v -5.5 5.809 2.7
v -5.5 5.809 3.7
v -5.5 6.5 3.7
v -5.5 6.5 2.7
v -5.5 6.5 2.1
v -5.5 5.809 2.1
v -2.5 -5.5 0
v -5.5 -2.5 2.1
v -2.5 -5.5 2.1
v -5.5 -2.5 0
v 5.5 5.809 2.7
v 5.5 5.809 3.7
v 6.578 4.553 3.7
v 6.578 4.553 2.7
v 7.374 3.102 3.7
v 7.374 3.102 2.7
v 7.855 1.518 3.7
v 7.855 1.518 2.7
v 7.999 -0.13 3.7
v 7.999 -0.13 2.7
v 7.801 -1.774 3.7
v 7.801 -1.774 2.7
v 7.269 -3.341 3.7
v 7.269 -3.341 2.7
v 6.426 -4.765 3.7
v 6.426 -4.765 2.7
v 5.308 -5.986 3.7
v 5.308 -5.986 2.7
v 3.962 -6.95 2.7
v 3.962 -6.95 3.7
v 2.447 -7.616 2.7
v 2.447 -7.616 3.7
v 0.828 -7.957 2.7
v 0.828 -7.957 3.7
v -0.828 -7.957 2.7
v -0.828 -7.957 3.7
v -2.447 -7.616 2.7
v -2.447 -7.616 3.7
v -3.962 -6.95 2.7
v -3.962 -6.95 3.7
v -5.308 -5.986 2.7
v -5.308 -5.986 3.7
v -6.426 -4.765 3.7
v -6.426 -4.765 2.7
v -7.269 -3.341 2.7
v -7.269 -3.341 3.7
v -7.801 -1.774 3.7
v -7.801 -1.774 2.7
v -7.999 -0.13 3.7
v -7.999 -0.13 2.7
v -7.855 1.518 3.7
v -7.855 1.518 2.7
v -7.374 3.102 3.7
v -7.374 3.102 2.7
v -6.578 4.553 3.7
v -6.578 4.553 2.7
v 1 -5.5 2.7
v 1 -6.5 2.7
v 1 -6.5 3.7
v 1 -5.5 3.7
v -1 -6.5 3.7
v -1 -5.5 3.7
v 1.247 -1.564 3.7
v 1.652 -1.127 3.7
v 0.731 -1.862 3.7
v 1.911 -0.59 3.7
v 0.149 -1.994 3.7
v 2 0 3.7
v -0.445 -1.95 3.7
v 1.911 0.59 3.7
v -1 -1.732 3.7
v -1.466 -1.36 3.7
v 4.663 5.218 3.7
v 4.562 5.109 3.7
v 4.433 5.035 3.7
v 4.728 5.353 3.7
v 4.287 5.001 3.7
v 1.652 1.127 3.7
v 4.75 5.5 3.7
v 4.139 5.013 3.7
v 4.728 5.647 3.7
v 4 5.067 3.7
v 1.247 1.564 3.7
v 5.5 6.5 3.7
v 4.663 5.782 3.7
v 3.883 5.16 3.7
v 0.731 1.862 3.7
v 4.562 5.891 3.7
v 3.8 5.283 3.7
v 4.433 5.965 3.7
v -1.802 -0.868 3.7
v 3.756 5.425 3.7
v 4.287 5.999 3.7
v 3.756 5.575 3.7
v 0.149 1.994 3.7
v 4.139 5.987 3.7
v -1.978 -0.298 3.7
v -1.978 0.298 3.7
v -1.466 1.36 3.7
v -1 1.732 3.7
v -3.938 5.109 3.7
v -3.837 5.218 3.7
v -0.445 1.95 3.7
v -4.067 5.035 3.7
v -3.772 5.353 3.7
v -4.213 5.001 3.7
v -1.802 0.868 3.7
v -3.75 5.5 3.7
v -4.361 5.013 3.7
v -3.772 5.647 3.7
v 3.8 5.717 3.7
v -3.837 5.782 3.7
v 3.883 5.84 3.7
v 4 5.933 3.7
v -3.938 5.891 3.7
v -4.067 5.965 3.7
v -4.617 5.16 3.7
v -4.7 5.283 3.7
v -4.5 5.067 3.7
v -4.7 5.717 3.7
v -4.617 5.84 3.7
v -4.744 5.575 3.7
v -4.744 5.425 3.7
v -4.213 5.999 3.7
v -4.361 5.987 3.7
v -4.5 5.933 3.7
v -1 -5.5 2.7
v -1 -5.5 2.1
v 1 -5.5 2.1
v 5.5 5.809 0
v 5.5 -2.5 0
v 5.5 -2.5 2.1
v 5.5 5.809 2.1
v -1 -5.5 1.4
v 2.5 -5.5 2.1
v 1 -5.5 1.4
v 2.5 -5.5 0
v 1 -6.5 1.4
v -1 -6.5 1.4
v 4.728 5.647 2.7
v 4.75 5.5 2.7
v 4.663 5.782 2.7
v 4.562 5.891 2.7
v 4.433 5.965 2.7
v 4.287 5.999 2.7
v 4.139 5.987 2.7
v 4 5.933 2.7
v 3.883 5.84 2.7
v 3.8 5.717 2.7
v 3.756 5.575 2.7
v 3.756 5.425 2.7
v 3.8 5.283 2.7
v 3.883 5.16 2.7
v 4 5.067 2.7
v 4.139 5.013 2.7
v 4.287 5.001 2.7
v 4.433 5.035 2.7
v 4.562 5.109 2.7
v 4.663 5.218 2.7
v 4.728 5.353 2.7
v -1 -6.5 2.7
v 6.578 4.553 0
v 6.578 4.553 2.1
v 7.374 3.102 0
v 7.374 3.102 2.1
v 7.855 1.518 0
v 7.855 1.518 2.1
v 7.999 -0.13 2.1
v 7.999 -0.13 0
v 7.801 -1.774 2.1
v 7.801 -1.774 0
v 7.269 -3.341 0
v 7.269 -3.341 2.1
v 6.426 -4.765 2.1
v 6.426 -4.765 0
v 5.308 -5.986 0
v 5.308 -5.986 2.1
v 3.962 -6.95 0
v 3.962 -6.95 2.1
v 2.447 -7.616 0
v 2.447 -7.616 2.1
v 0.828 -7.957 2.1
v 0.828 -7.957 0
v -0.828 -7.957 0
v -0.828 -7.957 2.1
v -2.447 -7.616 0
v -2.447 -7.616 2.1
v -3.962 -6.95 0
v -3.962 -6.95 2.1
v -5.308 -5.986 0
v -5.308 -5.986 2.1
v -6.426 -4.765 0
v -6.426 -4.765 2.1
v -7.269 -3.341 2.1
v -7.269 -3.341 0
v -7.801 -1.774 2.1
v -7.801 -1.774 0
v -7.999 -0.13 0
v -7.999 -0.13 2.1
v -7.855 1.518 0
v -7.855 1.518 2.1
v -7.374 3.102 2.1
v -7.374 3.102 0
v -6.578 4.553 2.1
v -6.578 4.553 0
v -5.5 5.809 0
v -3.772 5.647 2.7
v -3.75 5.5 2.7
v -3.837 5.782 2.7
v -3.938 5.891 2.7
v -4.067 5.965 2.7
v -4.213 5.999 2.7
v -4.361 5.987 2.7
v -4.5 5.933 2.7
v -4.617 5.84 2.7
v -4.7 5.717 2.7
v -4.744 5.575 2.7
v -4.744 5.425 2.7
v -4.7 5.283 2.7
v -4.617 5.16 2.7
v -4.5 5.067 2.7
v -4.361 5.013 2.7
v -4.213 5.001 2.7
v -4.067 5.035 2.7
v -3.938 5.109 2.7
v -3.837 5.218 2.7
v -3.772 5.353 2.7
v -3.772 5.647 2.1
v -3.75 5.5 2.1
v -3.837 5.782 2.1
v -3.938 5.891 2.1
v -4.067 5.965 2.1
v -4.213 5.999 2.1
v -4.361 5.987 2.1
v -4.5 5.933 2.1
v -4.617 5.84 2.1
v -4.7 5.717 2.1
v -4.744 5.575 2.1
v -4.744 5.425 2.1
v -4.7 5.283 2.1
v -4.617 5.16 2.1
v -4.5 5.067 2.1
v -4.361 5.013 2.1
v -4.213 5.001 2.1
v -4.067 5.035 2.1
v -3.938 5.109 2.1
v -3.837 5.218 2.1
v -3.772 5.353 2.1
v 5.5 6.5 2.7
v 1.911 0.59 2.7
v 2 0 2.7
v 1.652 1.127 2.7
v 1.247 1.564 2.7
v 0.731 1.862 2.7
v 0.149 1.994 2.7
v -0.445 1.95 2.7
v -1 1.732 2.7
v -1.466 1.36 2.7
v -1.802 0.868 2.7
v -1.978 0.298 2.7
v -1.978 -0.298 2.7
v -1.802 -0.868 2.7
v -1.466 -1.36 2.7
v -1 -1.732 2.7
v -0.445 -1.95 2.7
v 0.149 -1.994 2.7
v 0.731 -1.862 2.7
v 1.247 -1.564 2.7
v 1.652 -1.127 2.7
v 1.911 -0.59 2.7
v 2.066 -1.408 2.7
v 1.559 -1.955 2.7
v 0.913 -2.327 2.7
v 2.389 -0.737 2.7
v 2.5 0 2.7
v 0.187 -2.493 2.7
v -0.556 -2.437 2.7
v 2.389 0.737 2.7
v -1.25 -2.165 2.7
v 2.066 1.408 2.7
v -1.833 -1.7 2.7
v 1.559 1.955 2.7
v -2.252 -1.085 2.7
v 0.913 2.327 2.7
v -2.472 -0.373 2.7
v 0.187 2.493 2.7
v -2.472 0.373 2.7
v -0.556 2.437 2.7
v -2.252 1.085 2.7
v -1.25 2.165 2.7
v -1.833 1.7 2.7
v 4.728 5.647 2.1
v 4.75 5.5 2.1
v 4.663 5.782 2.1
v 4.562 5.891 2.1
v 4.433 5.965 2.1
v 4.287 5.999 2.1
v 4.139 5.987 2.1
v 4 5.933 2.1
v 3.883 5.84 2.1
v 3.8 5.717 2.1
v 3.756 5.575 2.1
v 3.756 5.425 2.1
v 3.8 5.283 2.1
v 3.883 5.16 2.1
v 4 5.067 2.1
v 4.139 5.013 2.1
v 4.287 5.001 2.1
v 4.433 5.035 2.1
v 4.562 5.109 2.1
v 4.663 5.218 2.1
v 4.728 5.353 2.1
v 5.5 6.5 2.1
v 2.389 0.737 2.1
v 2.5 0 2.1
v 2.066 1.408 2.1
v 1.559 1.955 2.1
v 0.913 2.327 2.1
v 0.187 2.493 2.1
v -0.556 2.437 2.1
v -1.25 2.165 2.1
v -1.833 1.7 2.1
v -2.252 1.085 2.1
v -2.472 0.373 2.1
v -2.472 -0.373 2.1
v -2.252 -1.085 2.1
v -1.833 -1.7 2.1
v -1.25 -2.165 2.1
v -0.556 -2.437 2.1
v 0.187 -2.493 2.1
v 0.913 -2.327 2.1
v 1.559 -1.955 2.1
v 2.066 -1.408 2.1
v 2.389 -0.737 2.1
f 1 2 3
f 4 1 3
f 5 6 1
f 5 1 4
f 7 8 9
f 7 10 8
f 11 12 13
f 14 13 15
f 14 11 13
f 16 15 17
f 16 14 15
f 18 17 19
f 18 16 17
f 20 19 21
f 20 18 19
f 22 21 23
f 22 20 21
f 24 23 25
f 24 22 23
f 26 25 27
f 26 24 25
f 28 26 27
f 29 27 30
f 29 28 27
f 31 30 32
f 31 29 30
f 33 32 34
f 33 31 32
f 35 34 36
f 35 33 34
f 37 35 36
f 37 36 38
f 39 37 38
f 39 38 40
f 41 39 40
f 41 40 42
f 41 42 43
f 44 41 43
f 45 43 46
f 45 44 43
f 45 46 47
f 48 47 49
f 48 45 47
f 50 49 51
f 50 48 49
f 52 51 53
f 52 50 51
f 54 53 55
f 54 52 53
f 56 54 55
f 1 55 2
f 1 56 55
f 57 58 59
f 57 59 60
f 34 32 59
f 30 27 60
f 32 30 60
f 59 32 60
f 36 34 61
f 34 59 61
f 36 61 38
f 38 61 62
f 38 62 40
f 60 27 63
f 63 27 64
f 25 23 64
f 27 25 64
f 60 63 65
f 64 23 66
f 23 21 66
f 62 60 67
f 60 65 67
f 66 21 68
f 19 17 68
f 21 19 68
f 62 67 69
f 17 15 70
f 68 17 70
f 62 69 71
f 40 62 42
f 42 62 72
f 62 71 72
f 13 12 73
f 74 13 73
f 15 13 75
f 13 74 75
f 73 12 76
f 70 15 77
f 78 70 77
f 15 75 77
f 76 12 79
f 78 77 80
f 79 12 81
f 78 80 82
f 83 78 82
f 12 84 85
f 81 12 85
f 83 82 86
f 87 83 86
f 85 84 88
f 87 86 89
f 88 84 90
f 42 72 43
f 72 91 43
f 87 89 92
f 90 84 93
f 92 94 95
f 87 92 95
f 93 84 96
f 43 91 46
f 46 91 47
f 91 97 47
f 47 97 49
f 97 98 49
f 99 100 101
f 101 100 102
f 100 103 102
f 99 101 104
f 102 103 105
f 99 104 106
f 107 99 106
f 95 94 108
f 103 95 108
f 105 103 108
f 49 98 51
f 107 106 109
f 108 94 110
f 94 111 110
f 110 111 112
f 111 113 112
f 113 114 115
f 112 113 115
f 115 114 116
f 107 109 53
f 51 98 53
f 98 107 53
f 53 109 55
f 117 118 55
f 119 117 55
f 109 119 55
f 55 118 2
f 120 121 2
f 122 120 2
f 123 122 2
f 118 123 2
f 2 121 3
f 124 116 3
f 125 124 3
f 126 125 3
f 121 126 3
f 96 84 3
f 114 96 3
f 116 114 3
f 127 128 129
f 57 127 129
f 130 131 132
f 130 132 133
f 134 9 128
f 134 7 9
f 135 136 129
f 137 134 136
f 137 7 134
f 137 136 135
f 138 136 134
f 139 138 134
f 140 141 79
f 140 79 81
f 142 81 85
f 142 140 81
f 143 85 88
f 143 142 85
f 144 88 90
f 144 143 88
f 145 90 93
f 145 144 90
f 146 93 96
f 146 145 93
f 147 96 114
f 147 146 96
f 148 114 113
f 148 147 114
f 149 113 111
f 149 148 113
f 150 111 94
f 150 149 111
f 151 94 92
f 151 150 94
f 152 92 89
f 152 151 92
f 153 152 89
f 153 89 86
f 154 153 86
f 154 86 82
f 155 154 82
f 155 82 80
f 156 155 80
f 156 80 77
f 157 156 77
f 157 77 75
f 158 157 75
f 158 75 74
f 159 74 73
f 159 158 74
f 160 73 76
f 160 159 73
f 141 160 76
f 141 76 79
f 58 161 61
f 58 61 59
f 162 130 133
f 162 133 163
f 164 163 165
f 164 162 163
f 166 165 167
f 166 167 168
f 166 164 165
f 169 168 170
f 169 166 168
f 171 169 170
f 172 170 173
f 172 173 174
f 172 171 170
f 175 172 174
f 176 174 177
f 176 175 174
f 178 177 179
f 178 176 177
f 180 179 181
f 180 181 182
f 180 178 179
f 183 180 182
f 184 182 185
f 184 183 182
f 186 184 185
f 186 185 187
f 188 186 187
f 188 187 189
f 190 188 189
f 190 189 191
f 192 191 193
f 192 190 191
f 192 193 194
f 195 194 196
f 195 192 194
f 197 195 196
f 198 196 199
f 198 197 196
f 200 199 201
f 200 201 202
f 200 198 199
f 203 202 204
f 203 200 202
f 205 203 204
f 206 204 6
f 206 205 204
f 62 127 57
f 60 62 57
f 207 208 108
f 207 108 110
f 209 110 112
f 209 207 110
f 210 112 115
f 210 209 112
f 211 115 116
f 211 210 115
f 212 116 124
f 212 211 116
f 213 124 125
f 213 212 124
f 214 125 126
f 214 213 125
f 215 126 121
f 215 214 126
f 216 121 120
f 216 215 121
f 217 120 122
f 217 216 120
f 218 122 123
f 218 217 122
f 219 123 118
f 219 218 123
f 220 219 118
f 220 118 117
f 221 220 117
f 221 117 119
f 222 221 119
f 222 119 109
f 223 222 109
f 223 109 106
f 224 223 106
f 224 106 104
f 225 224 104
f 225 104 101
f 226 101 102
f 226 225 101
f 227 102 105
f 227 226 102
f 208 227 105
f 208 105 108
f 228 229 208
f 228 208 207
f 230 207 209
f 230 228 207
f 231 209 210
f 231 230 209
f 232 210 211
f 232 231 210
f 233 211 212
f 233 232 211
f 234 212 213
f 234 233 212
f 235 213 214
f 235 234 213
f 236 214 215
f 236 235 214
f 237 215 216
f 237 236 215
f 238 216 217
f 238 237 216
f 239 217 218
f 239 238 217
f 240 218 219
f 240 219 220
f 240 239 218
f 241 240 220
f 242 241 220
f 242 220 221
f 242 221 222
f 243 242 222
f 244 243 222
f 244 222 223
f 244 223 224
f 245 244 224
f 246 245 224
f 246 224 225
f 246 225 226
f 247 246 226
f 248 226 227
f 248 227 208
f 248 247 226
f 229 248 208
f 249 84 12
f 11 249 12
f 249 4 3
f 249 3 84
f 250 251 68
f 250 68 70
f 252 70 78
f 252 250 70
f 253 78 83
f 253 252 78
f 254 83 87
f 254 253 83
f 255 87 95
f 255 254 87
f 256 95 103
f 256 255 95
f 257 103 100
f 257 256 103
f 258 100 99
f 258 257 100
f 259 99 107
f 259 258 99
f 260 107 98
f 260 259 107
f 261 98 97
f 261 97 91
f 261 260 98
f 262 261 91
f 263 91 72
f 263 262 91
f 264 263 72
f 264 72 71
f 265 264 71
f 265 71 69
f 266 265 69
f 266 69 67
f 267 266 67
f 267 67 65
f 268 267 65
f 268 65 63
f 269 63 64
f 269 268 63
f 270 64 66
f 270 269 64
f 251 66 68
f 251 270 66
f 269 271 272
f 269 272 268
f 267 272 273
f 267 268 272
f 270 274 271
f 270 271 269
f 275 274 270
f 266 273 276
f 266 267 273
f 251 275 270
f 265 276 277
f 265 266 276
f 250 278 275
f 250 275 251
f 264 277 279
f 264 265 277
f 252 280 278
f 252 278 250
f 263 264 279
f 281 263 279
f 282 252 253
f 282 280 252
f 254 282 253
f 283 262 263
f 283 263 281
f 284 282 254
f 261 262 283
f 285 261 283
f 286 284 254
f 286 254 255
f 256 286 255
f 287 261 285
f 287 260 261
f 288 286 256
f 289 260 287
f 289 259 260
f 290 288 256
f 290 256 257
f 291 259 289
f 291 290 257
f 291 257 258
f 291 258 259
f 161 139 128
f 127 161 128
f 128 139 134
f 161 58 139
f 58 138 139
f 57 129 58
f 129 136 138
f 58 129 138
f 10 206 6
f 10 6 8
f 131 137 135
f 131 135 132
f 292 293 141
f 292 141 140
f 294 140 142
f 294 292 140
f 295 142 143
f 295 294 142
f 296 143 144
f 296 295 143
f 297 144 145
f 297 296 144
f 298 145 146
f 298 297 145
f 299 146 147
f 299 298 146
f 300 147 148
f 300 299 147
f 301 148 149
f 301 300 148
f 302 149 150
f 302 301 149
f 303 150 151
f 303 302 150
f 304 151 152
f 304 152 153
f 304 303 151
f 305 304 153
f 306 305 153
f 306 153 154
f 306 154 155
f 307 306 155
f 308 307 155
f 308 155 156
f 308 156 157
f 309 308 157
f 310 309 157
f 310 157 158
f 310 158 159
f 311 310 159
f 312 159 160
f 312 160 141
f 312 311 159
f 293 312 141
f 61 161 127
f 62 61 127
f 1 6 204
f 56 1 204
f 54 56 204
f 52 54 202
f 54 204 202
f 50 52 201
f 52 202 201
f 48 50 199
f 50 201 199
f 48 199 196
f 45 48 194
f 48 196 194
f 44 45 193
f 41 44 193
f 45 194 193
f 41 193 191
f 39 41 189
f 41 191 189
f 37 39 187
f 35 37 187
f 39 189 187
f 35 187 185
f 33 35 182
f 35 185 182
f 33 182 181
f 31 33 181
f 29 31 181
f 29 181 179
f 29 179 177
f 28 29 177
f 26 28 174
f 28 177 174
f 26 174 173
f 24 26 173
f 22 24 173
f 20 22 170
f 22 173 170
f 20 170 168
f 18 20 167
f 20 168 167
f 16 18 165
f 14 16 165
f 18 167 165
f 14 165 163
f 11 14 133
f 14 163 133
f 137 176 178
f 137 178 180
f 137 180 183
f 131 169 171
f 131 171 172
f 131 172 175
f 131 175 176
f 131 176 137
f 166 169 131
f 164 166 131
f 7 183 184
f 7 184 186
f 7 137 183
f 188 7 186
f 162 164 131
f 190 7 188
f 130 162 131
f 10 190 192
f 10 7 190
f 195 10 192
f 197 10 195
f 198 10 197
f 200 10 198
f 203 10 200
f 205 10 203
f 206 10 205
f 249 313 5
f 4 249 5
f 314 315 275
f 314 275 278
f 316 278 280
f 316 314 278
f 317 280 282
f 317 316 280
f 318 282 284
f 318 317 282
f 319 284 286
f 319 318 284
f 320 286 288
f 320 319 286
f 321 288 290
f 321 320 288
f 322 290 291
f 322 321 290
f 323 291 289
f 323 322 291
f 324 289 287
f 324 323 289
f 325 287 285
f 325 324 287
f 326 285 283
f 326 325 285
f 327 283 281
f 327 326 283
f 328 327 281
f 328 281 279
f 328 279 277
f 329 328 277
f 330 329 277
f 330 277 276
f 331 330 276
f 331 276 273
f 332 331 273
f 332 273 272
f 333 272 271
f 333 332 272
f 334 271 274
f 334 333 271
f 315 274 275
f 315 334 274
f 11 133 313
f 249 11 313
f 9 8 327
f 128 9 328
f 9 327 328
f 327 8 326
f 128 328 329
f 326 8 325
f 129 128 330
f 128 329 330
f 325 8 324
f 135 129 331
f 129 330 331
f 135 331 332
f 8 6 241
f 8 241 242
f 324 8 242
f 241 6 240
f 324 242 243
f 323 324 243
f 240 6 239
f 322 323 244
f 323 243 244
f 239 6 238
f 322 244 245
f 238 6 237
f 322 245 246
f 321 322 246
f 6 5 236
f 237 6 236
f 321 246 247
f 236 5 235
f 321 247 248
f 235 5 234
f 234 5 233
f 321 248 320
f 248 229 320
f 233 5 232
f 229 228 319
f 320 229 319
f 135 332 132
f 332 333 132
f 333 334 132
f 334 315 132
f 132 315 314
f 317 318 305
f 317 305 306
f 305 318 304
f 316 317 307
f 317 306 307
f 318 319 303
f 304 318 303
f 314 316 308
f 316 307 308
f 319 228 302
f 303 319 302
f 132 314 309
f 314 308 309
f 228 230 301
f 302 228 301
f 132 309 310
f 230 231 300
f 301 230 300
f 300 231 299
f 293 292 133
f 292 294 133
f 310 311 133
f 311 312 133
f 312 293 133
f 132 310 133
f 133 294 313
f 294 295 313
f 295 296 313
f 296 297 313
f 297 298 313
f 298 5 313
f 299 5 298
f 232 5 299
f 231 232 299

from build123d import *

# Parameters (mm, degrees)
BOSS_EXTRUDE1_DEPTH = 1.4
BOSS_EXTRUDE2_DEPTH = 0.7
SKETCH3_R           = 0.5
SKETCH3_R_2         = 2.5
BOSS_EXTRUDE3_DEPTH = 0.6
SKETCH4_R           = 2
SKETCH4_R_2         = 0.5
SKETCH4_W           = 2
SKETCH4_H           = 1
BOSS_EXTRUDE4_DEPTH = 1


with BuildPart() as part:
    # Sketch1 → Boss-Extrude1 (new body)
    with BuildSketch(Plane.XY):
        with BuildLine():
            Line((-5.5, 5.809475019), (-5.5, -2.5))
            Line((-5.5, -2.5), (-2.5, -5.5))
            Line((-2.5, -5.5), (2.5, -5.5))
            Line((2.5, -5.5), (5.5, -2.5))
            Line((5.5, -2.5), (5.5, 5.809475019))
            ThreePointArc((5.5, 5.809475019), (0, -8), (-5.5, 5.809475019))
        make_face()
    extrude(amount=BOSS_EXTRUDE1_DEPTH)

    # Sketch2 → Boss-Extrude2 (add)
    with BuildSketch(Plane.XY.offset(1.4)):
        with BuildLine():
            Line((-1, -5.5), (-1, -6.5))
            Line((-1, -6.5), (1, -6.5))
            Line((1, -6.5), (1, -5.5))
            Line((1, -5.5), (2.5, -5.5))
            Line((2.5, -5.5), (5.5, -2.5))
            Line((5.5, -2.5), (5.5, 5.809475019))
            ThreePointArc((5.5, 5.809475019), (0, -8), (-5.5, 5.809475019))
            Line((-5.5, 5.809475019), (-5.5, -2.5))
            Line((-5.5, -2.5), (-2.5, -5.5))
            Line((-2.5, -5.5), (-1, -5.5))
        make_face()
    extrude(amount=BOSS_EXTRUDE2_DEPTH)

    # Sketch3 → Boss-Extrude3 (add)
    # profile 1 of 2: a face of its own
    with BuildSketch(Plane.XY.offset(2.1)):
        Polygon((2.5, -5.5), (5.5, -2.5), (5.5, 6.5), (-5.5, 6.5), (-5.5, -2.5), (-2.5, -5.5), align=None)
        with Locations((4.250000001, 5.5)):
            Circle(SKETCH3_R, mode=Mode.SUBTRACT)
        Circle(SKETCH3_R_2, mode=Mode.SUBTRACT)
        with Locations((-4.249999999, 5.5)):
            Circle(SKETCH3_R, mode=Mode.SUBTRACT)
    # profile 2 of 2: a face of its own
    with BuildSketch(Plane.XY.offset(2.1)):
        with BuildLine():
            Line((-1, -6.5), (-1, -5.5))
            Line((-1, -5.5), (-2.5, -5.5))
            Line((-2.5, -5.5), (-5.5, -2.5))
            Line((-5.5, -2.5), (-5.5, 5.809475019))
            ThreePointArc((-5.5, 5.809475019), (0, -8), (5.5, 5.809475019))
            Line((5.5, 5.809475019), (5.5, -2.5))
            Line((5.5, -2.5), (2.5, -5.5))
            Line((2.5, -5.5), (1, -5.5))
            Line((1, -5.5), (1, -6.5))
            Line((1, -6.5), (-1, -6.5))
        make_face()
    extrude(amount=BOSS_EXTRUDE3_DEPTH)

    # Sketch4 → Boss-Extrude4 (add)
    with BuildSketch(Plane.XY.offset(2.7)):
        with BuildLine():
            Line((-5.5, 5.809475019), (-5.5, 6.5))
            Line((-5.5, 6.5), (5.5, 6.5))
            Line((5.5, 6.5), (5.5, 5.809475019))
            ThreePointArc((5.5, 5.809475019), (0, -8), (-5.5, 5.809475019))
        make_face()
        Circle(SKETCH4_R, mode=Mode.SUBTRACT)
        with Locations((-4.249999999, 5.5)):
            Circle(SKETCH4_R_2, mode=Mode.SUBTRACT)
        with Locations((4.250000001, 5.5)):
            Circle(SKETCH4_R_2, mode=Mode.SUBTRACT)
        with Locations((0, -6)):
            Rectangle(SKETCH4_W, SKETCH4_H, mode=Mode.SUBTRACT)
    extrude(amount=BOSS_EXTRUDE4_DEPTH)


solid = part.part
